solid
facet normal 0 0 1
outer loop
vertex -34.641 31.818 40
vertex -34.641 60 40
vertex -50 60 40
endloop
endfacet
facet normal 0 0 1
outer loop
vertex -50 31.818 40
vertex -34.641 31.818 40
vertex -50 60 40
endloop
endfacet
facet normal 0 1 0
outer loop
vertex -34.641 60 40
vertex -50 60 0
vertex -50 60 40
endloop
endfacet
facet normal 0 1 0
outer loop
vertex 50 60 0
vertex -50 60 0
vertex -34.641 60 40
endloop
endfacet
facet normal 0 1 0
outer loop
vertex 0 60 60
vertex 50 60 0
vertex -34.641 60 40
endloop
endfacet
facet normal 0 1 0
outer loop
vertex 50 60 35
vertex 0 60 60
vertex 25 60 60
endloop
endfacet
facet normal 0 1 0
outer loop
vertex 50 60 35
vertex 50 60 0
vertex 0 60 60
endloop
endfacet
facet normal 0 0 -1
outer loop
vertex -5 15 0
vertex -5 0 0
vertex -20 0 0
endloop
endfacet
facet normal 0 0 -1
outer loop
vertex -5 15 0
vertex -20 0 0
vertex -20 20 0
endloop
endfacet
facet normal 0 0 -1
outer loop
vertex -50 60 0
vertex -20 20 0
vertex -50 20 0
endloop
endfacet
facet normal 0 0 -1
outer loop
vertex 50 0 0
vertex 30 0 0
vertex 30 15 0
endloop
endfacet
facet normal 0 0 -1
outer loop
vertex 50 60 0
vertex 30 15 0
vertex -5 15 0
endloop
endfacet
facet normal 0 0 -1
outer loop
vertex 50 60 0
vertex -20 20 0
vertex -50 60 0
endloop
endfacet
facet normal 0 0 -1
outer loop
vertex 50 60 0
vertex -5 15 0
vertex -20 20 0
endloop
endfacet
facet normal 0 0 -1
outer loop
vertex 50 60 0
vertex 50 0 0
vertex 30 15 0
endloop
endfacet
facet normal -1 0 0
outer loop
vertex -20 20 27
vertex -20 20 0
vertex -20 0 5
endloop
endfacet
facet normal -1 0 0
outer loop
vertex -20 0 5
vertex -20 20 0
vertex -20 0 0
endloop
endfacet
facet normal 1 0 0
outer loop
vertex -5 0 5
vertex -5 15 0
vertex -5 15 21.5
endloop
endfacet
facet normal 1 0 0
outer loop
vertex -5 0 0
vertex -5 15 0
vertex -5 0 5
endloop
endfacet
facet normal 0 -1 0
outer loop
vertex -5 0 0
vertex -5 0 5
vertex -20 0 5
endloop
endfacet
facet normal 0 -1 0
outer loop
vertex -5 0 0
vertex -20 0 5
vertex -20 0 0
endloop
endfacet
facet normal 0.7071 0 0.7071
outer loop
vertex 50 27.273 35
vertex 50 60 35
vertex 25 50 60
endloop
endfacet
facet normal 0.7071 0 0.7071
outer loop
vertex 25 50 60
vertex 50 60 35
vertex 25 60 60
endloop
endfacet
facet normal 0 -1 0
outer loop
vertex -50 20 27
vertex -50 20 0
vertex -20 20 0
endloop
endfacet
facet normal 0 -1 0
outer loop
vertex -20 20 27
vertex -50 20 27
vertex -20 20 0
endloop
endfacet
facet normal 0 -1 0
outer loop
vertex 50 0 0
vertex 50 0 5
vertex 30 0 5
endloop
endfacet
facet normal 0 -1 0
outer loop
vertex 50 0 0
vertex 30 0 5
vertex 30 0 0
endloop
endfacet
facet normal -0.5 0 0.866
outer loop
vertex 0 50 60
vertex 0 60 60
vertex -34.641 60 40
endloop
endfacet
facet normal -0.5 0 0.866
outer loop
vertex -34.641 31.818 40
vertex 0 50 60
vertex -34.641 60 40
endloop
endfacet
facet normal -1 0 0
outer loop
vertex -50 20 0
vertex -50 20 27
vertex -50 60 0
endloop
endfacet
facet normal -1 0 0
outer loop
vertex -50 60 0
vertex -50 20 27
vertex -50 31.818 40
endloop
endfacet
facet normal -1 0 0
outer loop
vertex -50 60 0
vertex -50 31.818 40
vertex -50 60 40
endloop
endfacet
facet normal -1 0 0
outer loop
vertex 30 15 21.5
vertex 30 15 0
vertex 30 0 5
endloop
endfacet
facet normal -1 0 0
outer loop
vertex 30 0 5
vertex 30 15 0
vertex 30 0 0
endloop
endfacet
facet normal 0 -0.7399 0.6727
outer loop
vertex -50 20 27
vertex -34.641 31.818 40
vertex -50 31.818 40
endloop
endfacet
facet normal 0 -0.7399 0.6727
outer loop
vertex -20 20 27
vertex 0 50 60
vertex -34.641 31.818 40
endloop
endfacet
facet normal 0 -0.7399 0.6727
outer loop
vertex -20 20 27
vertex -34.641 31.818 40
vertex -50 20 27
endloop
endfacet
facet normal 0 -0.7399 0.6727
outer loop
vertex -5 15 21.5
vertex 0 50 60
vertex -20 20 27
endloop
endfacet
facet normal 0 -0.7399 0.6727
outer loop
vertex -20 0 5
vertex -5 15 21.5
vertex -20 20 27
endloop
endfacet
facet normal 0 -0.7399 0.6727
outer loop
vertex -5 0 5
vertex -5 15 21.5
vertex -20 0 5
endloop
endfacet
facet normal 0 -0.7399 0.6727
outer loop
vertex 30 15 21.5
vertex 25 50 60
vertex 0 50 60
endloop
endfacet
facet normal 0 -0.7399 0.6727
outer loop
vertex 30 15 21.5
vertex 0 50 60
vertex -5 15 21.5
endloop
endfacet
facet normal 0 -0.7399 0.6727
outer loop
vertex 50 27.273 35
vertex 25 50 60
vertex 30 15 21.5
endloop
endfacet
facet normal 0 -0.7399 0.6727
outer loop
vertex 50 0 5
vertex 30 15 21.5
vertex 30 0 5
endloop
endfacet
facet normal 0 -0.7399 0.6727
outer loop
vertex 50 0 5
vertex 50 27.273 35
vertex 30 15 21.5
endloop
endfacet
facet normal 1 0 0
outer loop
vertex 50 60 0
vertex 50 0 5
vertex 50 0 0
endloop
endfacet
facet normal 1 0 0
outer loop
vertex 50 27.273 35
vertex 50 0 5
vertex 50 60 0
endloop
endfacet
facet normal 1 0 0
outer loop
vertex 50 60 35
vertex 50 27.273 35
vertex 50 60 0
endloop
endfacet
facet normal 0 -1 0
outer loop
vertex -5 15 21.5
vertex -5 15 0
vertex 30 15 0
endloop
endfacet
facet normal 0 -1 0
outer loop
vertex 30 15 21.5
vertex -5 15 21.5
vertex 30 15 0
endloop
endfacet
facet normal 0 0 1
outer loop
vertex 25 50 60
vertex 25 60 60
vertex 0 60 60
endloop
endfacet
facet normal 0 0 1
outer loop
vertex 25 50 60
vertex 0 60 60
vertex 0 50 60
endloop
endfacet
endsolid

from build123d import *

# Parameters (mm, degrees)
F1_DEPTH = 50
F2_W     = 35
F2_H     = 15
F2_W_2   = 30
F2_H_2   = 20
F3_DEPTH = 60.001
F5_DEPTH = 60.001


with BuildPart() as f1:
    # F0 (on Right) → F1 (new body, symmetric)
    with BuildSketch(Plane.YZ):
        Polygon((0, 5), (0, 0), (60, 0), (60, 60), (50, 60), align=None)
    extrude(amount=F1_DEPTH, both=True)

    # F2 (on face) → F3 (cut, through all)
    with BuildSketch(Plane(origin=(0, 0, 0), x_dir=(1, 0, 0), z_dir=(0, 0, -1))):
        with Locations((12.5, -7.5)):
            Rectangle(F2_W, F2_H)
        with Locations((-35, -10)):
            Rectangle(F2_W_2, F2_H_2)
    extrude(amount=-F3_DEPTH, mode=Mode.SUBTRACT)

    # F4 (on face) → F5 (cut, through all)
    with BuildSketch(Plane(origin=(0, 60, 0), x_dir=(-1, 0, 0), z_dir=(0, 1, 0))):
        Polygon((50, 60), (0, 60), (34.641016, 40), (50, 40), align=None)
        Polygon((-25, 60), (-50, 60), (-50, 35), align=None)
    extrude(amount=-F5_DEPTH, mode=Mode.SUBTRACT)


solid = f1.part
